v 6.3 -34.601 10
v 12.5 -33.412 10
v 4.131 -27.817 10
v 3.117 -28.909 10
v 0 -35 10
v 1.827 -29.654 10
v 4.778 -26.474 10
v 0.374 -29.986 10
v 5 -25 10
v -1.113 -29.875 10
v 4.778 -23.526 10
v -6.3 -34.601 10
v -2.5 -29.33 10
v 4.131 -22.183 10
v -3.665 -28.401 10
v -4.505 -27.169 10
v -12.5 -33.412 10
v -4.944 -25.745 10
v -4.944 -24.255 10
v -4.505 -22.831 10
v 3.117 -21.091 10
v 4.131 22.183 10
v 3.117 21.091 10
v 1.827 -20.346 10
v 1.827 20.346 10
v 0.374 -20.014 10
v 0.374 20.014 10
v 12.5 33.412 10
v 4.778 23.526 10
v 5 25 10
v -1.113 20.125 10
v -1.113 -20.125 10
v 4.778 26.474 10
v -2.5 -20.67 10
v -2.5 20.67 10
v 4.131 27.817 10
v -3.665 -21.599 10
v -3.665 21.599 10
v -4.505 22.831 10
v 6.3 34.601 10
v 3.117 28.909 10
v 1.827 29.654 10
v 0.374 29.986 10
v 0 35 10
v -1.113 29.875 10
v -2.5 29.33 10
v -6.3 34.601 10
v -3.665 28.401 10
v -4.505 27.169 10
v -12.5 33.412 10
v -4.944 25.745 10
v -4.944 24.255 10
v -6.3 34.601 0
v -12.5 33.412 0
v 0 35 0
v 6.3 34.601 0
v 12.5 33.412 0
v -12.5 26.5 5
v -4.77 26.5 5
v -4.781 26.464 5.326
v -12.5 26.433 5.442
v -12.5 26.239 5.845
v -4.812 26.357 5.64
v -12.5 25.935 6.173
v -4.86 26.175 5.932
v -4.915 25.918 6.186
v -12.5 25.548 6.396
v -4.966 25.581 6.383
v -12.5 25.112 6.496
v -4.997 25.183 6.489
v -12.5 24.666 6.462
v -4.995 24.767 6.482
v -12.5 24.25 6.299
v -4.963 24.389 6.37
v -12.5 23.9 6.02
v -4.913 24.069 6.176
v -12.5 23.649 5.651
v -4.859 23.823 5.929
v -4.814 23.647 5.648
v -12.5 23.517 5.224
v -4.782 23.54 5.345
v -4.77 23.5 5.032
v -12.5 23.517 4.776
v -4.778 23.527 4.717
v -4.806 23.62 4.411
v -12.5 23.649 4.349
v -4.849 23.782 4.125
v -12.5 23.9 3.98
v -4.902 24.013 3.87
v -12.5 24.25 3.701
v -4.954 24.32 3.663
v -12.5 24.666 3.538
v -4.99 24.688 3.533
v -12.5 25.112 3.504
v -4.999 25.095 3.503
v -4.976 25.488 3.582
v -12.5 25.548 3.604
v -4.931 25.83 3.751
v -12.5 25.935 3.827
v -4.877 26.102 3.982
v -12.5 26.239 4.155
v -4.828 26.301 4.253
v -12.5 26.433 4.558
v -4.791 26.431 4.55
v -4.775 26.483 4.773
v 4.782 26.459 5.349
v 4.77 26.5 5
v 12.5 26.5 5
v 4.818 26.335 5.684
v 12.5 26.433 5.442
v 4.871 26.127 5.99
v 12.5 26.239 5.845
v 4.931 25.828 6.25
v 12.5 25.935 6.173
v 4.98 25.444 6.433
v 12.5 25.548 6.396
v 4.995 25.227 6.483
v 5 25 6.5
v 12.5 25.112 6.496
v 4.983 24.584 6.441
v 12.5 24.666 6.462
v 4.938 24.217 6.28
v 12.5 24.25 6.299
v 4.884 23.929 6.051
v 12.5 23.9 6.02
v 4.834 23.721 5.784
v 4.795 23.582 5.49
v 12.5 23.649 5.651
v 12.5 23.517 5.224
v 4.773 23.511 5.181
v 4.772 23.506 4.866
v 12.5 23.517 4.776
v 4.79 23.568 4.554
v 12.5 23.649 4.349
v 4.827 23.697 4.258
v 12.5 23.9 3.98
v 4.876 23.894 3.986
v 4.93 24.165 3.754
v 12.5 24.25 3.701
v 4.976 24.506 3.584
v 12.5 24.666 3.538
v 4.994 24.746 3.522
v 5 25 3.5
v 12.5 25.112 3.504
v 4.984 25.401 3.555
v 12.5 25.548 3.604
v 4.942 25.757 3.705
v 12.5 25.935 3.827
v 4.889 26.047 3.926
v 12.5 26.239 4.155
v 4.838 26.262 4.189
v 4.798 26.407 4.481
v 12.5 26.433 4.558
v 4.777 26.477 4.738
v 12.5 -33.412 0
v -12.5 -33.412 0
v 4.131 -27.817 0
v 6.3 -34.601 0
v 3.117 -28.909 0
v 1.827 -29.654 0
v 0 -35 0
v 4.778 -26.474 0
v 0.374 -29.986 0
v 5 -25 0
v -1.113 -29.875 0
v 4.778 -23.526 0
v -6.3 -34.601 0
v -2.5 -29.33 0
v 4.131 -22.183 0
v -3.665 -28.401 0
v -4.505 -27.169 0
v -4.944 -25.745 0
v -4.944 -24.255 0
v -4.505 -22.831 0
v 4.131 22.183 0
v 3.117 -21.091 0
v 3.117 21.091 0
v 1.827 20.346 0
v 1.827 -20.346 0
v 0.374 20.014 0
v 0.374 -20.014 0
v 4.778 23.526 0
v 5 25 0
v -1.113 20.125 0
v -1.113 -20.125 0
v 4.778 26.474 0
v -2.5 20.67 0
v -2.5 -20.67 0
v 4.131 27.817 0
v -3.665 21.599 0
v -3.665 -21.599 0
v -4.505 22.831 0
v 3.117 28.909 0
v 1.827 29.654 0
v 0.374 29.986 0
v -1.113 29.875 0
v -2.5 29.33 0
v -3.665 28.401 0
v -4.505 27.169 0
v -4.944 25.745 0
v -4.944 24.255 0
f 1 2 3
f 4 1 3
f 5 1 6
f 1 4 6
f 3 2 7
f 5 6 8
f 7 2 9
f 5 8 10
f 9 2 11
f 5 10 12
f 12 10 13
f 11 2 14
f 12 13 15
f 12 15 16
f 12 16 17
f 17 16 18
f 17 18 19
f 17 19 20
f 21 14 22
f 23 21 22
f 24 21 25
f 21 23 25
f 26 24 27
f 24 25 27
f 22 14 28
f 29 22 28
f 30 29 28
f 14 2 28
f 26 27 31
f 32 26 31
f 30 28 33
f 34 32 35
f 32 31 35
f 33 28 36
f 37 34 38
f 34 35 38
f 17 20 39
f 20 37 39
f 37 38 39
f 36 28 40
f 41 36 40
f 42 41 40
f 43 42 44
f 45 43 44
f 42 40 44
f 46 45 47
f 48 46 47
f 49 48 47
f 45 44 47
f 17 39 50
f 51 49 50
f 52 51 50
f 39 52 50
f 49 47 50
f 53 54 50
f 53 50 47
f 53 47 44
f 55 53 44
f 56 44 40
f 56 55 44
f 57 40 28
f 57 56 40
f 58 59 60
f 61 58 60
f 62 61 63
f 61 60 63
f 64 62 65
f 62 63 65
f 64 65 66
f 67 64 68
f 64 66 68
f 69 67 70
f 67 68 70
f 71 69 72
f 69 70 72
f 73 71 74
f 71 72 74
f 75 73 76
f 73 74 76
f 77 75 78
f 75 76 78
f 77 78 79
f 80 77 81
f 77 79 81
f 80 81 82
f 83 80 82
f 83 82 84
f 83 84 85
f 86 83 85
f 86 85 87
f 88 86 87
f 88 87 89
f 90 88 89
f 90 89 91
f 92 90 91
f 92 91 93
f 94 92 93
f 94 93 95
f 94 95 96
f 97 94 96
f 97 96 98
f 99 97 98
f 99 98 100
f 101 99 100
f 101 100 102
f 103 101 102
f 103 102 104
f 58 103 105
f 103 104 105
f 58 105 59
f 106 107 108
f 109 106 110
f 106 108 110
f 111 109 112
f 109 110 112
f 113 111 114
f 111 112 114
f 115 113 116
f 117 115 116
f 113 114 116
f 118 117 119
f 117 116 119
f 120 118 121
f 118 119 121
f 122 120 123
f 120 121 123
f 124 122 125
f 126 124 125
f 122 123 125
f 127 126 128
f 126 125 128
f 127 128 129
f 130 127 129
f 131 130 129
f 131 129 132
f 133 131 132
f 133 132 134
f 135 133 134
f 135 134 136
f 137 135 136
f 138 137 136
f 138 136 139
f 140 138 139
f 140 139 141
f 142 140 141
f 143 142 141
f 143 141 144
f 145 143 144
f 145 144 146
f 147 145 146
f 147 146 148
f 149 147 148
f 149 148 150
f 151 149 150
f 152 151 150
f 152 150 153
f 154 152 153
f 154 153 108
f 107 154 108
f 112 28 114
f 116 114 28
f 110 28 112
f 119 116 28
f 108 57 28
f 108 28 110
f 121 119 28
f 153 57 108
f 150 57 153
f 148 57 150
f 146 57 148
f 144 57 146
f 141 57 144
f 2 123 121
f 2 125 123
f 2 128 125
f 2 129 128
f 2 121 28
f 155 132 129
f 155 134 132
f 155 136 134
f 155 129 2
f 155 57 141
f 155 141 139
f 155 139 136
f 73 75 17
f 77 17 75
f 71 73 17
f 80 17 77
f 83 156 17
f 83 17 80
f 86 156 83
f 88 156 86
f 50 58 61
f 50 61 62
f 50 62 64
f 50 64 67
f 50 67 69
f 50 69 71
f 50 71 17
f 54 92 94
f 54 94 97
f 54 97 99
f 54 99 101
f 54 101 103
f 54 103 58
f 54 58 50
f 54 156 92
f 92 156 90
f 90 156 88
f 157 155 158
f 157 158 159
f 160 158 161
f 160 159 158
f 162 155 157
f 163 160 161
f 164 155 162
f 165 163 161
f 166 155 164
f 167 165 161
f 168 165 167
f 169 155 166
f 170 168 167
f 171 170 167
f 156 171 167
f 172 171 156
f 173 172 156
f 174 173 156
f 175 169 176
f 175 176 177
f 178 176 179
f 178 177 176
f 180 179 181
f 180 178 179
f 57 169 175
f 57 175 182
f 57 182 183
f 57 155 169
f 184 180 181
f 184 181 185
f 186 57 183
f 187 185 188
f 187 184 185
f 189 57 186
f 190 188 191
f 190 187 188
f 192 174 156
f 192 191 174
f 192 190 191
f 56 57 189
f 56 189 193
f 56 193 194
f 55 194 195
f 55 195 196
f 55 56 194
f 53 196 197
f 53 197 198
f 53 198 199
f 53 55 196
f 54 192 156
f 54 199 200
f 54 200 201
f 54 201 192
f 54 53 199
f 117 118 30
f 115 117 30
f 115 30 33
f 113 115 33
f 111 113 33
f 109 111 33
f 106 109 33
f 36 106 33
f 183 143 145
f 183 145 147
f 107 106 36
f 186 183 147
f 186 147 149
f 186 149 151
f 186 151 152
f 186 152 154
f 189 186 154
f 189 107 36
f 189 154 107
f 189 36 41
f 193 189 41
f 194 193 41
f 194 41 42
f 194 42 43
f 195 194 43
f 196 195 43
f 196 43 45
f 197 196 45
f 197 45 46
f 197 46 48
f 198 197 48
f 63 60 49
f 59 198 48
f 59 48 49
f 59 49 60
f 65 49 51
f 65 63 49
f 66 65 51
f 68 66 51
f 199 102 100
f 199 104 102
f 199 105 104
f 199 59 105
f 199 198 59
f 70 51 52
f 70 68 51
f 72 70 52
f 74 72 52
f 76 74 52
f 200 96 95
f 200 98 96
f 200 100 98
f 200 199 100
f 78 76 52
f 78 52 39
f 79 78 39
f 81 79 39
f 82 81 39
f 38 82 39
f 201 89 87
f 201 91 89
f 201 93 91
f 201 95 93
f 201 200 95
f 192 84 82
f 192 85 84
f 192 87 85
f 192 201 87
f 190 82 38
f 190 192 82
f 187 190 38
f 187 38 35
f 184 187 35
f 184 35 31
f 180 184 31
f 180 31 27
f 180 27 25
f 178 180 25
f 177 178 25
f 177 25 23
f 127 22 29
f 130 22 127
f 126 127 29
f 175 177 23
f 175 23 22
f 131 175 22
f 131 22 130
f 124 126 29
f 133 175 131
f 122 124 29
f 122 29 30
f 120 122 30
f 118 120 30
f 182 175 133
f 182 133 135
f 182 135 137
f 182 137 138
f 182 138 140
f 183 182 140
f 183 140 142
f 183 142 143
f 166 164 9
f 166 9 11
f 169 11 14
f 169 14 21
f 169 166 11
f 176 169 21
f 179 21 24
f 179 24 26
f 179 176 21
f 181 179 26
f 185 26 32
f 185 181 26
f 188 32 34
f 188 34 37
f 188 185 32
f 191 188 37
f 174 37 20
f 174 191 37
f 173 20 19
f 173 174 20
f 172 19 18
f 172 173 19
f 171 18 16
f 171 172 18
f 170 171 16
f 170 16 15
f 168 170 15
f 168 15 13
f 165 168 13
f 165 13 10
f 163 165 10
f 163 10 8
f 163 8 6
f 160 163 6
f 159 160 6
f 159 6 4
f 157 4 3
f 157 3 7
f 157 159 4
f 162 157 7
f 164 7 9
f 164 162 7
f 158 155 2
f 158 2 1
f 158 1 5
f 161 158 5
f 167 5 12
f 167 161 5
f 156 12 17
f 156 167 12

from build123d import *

# Parameters (mm, degrees)
SKETCH1_R             = 5
CORPO_DEPTH           = 10
SKETCH2_R             = 1.5
FURO_3_PASSANTE_DEPTH = 45.158804332


with BuildPart() as part:
    # Sketch1 → Corpo (new body)
    with BuildSketch(Plane.XY):
        with BuildLine():
            Line((-12.5, -33.412291828), (-12.5, 33.412291828))
            ThreePointArc((-12.5, 33.412291828), (0, 35), (12.5, 33.412291828))
            Line((12.5, 33.412291828), (12.5, -33.412291828))
            ThreePointArc((12.5, -33.412291828), (0, -35), (-12.5, -33.412291828))
        make_face()
        with Locations((0, -25)):
            Circle(SKETCH1_R, mode=Mode.SUBTRACT)
        with Locations((0, 25)):
            Circle(SKETCH1_R, mode=Mode.SUBTRACT)
    extrude(amount=CORPO_DEPTH)

    # Sketch2 → Furo Ø3 Passante (cut, through all)
    with BuildSketch(Plane(origin=(12.5, 0, 0), x_dir=(0, 0, -1), z_dir=(1, 0, 0))):
        with Locations(Location((-5, 25, 0), (0, 0, 90))):
            Circle(SKETCH2_R)
    extrude(amount=-FURO_3_PASSANTE_DEPTH, mode=Mode.SUBTRACT)


solid = part.part
